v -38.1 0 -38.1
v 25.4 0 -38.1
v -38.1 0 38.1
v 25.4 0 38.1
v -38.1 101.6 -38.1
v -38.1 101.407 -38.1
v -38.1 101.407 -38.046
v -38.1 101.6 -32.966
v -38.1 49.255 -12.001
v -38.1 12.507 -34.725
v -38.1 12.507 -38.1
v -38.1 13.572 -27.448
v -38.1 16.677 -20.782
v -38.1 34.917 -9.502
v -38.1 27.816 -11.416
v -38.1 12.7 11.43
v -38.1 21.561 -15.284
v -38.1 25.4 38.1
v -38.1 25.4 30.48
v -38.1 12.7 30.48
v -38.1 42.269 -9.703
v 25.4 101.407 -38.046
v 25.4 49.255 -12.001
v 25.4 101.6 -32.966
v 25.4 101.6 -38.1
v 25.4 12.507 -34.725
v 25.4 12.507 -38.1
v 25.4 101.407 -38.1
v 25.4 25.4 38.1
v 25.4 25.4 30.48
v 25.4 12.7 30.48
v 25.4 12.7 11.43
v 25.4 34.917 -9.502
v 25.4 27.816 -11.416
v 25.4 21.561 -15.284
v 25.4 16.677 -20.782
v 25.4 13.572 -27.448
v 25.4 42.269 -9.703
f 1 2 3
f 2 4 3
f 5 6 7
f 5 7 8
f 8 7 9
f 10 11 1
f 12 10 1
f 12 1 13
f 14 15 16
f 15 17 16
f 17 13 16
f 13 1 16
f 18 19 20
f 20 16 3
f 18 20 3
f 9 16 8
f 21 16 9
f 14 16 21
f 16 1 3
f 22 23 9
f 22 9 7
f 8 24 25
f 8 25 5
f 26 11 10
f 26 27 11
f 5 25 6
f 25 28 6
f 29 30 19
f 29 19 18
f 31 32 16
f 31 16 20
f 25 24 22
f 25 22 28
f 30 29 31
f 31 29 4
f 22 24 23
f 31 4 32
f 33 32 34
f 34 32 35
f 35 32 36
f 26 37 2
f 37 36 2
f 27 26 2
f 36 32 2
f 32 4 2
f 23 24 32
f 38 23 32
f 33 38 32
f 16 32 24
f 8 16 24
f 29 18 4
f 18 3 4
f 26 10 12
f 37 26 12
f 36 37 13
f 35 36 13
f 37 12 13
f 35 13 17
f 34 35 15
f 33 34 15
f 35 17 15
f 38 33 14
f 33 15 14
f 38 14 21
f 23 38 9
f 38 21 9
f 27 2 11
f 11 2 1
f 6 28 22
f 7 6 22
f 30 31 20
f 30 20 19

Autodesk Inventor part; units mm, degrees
ref_plane "YZ Plane" through (0, 0, 0) normal (1, 0, 0) x (0, 1, 0)
ref_plane "XZ Plane" through (0, 0, 0) normal (0, 1, 0) x (-1, 0, 0)
ref_plane "XY Plane" through (0, 0, 0) normal (0, 0, 1) x (1, 0, 0)
sketch "Sketch1" plane through (0, 0, 0) normal (0, 1, 0) x (-1, 0, 0)
  line L0 (38.1, 38.1) -> (-38.1, 38.1)
  line L1 (-38.1, 38.1) -> (-38.1, -38.1)
  line L2 (-38.1, -38.1) -> (38.1, -38.1)
  line L3 (38.1, -38.1) -> (38.1, 38.1)
  line L4 (38.1, 38.1) -> (-38.1, -38.1) construction
  line L5 (-38.1, 38.1) -> (38.1, -38.1) construction
  point P0 (0, 0)
  dimension "d0" = 76.2
  dimension "d1" = 76.2
extrude "Extrusion1" add sketch "Sketch1" along normal blind 101.6
sketch "Sketch2" plane through (38.1, 0, 38.1) normal (1, 0, 0) x (0, 0, -1)
  line L0 (31.7497, 12.5069) -> (76.1457, 101.4069)
  line L1 (76.1457, 101.4069) -> (165.0457, 101.4069) construction
  line L2 (76.1457, 12.5069) -> (31.7497, 12.5069)
  line L3 (76.1457, 12.5069) -> (78.6857, 12.5069)
  line L4 (78.6857, 12.5069) -> (78.6857, 101.4069)
  line L5 (78.6857, 101.4069) -> (76.1457, 101.4069)
  point P0 (38.1, 0)
  dimension "d8" = 88.9
  dimension "d10" = 2.54
  dimension "d11" = 88.9
extrude "Extrusion2" cut sketch "Sketch2" against normal blind 101.6
fillet "Fillet1" radius 25.4 1 edges at (0, 12.5069, 6.3503)
sketch "Sketch3" plane through (38.1, 0, 38.1) normal (1, 0, 0) x (0, 0, -1)
  line L0 (7.62, 25.4) -> (0, 25.4)
  line L1 (26.67, 12.7) -> (7.62, 12.7)
  line L2 (26.67, 12.7) -> (71.066, 101.6)
  line L3 (76.2, 101.6) -> (0, 101.6) projected
  line L4 (0, 25.4) -> (-2.0413, 103.693)
  line L5 (-2.0413, 103.693) -> (71.066, 101.6)
  line L6 (7.62, 12.7) -> (7.62, 25.4)
  line L7 (50.1015, 49.2551) -> (76.1457, 101.4069) projected
  point P0 (38.1, 0)
  dimension "d15" = 7.62
  dimension "d17" = 19.05
extrude "Extrusion3" cut sketch "Sketch3" against normal blind 101.6
sketch "Sketch4" plane through (0, 0, 0) normal (0, -1, 0) x (1, 0, 0)
  line L0 (50.8, 45.6457) -> (25.4, 45.6457)
  line L1 (25.4, 45.6457) -> (25.4, -45.6457)
  line L2 (25.4, -45.6457) -> (50.8, -45.6457)
  line L3 (50.8, -45.6457) -> (50.8, 45.6457)
  line L4 (38.1, -32.966) -> (38.1, 11.43) projected
  line L5 (50.8, 45.6457) -> (25.4, -45.6457) construction
  line L6 (25.4, 45.6457) -> (50.8, -45.6457) construction
  point P0 (0, 0)
  point P1 (38.1, 0)
  dimension "d21" = 25.4
extrude "Extrusion4" cut sketch "Sketch4" against normal blind 101.6
properties part number "hahahaurwelcome"
